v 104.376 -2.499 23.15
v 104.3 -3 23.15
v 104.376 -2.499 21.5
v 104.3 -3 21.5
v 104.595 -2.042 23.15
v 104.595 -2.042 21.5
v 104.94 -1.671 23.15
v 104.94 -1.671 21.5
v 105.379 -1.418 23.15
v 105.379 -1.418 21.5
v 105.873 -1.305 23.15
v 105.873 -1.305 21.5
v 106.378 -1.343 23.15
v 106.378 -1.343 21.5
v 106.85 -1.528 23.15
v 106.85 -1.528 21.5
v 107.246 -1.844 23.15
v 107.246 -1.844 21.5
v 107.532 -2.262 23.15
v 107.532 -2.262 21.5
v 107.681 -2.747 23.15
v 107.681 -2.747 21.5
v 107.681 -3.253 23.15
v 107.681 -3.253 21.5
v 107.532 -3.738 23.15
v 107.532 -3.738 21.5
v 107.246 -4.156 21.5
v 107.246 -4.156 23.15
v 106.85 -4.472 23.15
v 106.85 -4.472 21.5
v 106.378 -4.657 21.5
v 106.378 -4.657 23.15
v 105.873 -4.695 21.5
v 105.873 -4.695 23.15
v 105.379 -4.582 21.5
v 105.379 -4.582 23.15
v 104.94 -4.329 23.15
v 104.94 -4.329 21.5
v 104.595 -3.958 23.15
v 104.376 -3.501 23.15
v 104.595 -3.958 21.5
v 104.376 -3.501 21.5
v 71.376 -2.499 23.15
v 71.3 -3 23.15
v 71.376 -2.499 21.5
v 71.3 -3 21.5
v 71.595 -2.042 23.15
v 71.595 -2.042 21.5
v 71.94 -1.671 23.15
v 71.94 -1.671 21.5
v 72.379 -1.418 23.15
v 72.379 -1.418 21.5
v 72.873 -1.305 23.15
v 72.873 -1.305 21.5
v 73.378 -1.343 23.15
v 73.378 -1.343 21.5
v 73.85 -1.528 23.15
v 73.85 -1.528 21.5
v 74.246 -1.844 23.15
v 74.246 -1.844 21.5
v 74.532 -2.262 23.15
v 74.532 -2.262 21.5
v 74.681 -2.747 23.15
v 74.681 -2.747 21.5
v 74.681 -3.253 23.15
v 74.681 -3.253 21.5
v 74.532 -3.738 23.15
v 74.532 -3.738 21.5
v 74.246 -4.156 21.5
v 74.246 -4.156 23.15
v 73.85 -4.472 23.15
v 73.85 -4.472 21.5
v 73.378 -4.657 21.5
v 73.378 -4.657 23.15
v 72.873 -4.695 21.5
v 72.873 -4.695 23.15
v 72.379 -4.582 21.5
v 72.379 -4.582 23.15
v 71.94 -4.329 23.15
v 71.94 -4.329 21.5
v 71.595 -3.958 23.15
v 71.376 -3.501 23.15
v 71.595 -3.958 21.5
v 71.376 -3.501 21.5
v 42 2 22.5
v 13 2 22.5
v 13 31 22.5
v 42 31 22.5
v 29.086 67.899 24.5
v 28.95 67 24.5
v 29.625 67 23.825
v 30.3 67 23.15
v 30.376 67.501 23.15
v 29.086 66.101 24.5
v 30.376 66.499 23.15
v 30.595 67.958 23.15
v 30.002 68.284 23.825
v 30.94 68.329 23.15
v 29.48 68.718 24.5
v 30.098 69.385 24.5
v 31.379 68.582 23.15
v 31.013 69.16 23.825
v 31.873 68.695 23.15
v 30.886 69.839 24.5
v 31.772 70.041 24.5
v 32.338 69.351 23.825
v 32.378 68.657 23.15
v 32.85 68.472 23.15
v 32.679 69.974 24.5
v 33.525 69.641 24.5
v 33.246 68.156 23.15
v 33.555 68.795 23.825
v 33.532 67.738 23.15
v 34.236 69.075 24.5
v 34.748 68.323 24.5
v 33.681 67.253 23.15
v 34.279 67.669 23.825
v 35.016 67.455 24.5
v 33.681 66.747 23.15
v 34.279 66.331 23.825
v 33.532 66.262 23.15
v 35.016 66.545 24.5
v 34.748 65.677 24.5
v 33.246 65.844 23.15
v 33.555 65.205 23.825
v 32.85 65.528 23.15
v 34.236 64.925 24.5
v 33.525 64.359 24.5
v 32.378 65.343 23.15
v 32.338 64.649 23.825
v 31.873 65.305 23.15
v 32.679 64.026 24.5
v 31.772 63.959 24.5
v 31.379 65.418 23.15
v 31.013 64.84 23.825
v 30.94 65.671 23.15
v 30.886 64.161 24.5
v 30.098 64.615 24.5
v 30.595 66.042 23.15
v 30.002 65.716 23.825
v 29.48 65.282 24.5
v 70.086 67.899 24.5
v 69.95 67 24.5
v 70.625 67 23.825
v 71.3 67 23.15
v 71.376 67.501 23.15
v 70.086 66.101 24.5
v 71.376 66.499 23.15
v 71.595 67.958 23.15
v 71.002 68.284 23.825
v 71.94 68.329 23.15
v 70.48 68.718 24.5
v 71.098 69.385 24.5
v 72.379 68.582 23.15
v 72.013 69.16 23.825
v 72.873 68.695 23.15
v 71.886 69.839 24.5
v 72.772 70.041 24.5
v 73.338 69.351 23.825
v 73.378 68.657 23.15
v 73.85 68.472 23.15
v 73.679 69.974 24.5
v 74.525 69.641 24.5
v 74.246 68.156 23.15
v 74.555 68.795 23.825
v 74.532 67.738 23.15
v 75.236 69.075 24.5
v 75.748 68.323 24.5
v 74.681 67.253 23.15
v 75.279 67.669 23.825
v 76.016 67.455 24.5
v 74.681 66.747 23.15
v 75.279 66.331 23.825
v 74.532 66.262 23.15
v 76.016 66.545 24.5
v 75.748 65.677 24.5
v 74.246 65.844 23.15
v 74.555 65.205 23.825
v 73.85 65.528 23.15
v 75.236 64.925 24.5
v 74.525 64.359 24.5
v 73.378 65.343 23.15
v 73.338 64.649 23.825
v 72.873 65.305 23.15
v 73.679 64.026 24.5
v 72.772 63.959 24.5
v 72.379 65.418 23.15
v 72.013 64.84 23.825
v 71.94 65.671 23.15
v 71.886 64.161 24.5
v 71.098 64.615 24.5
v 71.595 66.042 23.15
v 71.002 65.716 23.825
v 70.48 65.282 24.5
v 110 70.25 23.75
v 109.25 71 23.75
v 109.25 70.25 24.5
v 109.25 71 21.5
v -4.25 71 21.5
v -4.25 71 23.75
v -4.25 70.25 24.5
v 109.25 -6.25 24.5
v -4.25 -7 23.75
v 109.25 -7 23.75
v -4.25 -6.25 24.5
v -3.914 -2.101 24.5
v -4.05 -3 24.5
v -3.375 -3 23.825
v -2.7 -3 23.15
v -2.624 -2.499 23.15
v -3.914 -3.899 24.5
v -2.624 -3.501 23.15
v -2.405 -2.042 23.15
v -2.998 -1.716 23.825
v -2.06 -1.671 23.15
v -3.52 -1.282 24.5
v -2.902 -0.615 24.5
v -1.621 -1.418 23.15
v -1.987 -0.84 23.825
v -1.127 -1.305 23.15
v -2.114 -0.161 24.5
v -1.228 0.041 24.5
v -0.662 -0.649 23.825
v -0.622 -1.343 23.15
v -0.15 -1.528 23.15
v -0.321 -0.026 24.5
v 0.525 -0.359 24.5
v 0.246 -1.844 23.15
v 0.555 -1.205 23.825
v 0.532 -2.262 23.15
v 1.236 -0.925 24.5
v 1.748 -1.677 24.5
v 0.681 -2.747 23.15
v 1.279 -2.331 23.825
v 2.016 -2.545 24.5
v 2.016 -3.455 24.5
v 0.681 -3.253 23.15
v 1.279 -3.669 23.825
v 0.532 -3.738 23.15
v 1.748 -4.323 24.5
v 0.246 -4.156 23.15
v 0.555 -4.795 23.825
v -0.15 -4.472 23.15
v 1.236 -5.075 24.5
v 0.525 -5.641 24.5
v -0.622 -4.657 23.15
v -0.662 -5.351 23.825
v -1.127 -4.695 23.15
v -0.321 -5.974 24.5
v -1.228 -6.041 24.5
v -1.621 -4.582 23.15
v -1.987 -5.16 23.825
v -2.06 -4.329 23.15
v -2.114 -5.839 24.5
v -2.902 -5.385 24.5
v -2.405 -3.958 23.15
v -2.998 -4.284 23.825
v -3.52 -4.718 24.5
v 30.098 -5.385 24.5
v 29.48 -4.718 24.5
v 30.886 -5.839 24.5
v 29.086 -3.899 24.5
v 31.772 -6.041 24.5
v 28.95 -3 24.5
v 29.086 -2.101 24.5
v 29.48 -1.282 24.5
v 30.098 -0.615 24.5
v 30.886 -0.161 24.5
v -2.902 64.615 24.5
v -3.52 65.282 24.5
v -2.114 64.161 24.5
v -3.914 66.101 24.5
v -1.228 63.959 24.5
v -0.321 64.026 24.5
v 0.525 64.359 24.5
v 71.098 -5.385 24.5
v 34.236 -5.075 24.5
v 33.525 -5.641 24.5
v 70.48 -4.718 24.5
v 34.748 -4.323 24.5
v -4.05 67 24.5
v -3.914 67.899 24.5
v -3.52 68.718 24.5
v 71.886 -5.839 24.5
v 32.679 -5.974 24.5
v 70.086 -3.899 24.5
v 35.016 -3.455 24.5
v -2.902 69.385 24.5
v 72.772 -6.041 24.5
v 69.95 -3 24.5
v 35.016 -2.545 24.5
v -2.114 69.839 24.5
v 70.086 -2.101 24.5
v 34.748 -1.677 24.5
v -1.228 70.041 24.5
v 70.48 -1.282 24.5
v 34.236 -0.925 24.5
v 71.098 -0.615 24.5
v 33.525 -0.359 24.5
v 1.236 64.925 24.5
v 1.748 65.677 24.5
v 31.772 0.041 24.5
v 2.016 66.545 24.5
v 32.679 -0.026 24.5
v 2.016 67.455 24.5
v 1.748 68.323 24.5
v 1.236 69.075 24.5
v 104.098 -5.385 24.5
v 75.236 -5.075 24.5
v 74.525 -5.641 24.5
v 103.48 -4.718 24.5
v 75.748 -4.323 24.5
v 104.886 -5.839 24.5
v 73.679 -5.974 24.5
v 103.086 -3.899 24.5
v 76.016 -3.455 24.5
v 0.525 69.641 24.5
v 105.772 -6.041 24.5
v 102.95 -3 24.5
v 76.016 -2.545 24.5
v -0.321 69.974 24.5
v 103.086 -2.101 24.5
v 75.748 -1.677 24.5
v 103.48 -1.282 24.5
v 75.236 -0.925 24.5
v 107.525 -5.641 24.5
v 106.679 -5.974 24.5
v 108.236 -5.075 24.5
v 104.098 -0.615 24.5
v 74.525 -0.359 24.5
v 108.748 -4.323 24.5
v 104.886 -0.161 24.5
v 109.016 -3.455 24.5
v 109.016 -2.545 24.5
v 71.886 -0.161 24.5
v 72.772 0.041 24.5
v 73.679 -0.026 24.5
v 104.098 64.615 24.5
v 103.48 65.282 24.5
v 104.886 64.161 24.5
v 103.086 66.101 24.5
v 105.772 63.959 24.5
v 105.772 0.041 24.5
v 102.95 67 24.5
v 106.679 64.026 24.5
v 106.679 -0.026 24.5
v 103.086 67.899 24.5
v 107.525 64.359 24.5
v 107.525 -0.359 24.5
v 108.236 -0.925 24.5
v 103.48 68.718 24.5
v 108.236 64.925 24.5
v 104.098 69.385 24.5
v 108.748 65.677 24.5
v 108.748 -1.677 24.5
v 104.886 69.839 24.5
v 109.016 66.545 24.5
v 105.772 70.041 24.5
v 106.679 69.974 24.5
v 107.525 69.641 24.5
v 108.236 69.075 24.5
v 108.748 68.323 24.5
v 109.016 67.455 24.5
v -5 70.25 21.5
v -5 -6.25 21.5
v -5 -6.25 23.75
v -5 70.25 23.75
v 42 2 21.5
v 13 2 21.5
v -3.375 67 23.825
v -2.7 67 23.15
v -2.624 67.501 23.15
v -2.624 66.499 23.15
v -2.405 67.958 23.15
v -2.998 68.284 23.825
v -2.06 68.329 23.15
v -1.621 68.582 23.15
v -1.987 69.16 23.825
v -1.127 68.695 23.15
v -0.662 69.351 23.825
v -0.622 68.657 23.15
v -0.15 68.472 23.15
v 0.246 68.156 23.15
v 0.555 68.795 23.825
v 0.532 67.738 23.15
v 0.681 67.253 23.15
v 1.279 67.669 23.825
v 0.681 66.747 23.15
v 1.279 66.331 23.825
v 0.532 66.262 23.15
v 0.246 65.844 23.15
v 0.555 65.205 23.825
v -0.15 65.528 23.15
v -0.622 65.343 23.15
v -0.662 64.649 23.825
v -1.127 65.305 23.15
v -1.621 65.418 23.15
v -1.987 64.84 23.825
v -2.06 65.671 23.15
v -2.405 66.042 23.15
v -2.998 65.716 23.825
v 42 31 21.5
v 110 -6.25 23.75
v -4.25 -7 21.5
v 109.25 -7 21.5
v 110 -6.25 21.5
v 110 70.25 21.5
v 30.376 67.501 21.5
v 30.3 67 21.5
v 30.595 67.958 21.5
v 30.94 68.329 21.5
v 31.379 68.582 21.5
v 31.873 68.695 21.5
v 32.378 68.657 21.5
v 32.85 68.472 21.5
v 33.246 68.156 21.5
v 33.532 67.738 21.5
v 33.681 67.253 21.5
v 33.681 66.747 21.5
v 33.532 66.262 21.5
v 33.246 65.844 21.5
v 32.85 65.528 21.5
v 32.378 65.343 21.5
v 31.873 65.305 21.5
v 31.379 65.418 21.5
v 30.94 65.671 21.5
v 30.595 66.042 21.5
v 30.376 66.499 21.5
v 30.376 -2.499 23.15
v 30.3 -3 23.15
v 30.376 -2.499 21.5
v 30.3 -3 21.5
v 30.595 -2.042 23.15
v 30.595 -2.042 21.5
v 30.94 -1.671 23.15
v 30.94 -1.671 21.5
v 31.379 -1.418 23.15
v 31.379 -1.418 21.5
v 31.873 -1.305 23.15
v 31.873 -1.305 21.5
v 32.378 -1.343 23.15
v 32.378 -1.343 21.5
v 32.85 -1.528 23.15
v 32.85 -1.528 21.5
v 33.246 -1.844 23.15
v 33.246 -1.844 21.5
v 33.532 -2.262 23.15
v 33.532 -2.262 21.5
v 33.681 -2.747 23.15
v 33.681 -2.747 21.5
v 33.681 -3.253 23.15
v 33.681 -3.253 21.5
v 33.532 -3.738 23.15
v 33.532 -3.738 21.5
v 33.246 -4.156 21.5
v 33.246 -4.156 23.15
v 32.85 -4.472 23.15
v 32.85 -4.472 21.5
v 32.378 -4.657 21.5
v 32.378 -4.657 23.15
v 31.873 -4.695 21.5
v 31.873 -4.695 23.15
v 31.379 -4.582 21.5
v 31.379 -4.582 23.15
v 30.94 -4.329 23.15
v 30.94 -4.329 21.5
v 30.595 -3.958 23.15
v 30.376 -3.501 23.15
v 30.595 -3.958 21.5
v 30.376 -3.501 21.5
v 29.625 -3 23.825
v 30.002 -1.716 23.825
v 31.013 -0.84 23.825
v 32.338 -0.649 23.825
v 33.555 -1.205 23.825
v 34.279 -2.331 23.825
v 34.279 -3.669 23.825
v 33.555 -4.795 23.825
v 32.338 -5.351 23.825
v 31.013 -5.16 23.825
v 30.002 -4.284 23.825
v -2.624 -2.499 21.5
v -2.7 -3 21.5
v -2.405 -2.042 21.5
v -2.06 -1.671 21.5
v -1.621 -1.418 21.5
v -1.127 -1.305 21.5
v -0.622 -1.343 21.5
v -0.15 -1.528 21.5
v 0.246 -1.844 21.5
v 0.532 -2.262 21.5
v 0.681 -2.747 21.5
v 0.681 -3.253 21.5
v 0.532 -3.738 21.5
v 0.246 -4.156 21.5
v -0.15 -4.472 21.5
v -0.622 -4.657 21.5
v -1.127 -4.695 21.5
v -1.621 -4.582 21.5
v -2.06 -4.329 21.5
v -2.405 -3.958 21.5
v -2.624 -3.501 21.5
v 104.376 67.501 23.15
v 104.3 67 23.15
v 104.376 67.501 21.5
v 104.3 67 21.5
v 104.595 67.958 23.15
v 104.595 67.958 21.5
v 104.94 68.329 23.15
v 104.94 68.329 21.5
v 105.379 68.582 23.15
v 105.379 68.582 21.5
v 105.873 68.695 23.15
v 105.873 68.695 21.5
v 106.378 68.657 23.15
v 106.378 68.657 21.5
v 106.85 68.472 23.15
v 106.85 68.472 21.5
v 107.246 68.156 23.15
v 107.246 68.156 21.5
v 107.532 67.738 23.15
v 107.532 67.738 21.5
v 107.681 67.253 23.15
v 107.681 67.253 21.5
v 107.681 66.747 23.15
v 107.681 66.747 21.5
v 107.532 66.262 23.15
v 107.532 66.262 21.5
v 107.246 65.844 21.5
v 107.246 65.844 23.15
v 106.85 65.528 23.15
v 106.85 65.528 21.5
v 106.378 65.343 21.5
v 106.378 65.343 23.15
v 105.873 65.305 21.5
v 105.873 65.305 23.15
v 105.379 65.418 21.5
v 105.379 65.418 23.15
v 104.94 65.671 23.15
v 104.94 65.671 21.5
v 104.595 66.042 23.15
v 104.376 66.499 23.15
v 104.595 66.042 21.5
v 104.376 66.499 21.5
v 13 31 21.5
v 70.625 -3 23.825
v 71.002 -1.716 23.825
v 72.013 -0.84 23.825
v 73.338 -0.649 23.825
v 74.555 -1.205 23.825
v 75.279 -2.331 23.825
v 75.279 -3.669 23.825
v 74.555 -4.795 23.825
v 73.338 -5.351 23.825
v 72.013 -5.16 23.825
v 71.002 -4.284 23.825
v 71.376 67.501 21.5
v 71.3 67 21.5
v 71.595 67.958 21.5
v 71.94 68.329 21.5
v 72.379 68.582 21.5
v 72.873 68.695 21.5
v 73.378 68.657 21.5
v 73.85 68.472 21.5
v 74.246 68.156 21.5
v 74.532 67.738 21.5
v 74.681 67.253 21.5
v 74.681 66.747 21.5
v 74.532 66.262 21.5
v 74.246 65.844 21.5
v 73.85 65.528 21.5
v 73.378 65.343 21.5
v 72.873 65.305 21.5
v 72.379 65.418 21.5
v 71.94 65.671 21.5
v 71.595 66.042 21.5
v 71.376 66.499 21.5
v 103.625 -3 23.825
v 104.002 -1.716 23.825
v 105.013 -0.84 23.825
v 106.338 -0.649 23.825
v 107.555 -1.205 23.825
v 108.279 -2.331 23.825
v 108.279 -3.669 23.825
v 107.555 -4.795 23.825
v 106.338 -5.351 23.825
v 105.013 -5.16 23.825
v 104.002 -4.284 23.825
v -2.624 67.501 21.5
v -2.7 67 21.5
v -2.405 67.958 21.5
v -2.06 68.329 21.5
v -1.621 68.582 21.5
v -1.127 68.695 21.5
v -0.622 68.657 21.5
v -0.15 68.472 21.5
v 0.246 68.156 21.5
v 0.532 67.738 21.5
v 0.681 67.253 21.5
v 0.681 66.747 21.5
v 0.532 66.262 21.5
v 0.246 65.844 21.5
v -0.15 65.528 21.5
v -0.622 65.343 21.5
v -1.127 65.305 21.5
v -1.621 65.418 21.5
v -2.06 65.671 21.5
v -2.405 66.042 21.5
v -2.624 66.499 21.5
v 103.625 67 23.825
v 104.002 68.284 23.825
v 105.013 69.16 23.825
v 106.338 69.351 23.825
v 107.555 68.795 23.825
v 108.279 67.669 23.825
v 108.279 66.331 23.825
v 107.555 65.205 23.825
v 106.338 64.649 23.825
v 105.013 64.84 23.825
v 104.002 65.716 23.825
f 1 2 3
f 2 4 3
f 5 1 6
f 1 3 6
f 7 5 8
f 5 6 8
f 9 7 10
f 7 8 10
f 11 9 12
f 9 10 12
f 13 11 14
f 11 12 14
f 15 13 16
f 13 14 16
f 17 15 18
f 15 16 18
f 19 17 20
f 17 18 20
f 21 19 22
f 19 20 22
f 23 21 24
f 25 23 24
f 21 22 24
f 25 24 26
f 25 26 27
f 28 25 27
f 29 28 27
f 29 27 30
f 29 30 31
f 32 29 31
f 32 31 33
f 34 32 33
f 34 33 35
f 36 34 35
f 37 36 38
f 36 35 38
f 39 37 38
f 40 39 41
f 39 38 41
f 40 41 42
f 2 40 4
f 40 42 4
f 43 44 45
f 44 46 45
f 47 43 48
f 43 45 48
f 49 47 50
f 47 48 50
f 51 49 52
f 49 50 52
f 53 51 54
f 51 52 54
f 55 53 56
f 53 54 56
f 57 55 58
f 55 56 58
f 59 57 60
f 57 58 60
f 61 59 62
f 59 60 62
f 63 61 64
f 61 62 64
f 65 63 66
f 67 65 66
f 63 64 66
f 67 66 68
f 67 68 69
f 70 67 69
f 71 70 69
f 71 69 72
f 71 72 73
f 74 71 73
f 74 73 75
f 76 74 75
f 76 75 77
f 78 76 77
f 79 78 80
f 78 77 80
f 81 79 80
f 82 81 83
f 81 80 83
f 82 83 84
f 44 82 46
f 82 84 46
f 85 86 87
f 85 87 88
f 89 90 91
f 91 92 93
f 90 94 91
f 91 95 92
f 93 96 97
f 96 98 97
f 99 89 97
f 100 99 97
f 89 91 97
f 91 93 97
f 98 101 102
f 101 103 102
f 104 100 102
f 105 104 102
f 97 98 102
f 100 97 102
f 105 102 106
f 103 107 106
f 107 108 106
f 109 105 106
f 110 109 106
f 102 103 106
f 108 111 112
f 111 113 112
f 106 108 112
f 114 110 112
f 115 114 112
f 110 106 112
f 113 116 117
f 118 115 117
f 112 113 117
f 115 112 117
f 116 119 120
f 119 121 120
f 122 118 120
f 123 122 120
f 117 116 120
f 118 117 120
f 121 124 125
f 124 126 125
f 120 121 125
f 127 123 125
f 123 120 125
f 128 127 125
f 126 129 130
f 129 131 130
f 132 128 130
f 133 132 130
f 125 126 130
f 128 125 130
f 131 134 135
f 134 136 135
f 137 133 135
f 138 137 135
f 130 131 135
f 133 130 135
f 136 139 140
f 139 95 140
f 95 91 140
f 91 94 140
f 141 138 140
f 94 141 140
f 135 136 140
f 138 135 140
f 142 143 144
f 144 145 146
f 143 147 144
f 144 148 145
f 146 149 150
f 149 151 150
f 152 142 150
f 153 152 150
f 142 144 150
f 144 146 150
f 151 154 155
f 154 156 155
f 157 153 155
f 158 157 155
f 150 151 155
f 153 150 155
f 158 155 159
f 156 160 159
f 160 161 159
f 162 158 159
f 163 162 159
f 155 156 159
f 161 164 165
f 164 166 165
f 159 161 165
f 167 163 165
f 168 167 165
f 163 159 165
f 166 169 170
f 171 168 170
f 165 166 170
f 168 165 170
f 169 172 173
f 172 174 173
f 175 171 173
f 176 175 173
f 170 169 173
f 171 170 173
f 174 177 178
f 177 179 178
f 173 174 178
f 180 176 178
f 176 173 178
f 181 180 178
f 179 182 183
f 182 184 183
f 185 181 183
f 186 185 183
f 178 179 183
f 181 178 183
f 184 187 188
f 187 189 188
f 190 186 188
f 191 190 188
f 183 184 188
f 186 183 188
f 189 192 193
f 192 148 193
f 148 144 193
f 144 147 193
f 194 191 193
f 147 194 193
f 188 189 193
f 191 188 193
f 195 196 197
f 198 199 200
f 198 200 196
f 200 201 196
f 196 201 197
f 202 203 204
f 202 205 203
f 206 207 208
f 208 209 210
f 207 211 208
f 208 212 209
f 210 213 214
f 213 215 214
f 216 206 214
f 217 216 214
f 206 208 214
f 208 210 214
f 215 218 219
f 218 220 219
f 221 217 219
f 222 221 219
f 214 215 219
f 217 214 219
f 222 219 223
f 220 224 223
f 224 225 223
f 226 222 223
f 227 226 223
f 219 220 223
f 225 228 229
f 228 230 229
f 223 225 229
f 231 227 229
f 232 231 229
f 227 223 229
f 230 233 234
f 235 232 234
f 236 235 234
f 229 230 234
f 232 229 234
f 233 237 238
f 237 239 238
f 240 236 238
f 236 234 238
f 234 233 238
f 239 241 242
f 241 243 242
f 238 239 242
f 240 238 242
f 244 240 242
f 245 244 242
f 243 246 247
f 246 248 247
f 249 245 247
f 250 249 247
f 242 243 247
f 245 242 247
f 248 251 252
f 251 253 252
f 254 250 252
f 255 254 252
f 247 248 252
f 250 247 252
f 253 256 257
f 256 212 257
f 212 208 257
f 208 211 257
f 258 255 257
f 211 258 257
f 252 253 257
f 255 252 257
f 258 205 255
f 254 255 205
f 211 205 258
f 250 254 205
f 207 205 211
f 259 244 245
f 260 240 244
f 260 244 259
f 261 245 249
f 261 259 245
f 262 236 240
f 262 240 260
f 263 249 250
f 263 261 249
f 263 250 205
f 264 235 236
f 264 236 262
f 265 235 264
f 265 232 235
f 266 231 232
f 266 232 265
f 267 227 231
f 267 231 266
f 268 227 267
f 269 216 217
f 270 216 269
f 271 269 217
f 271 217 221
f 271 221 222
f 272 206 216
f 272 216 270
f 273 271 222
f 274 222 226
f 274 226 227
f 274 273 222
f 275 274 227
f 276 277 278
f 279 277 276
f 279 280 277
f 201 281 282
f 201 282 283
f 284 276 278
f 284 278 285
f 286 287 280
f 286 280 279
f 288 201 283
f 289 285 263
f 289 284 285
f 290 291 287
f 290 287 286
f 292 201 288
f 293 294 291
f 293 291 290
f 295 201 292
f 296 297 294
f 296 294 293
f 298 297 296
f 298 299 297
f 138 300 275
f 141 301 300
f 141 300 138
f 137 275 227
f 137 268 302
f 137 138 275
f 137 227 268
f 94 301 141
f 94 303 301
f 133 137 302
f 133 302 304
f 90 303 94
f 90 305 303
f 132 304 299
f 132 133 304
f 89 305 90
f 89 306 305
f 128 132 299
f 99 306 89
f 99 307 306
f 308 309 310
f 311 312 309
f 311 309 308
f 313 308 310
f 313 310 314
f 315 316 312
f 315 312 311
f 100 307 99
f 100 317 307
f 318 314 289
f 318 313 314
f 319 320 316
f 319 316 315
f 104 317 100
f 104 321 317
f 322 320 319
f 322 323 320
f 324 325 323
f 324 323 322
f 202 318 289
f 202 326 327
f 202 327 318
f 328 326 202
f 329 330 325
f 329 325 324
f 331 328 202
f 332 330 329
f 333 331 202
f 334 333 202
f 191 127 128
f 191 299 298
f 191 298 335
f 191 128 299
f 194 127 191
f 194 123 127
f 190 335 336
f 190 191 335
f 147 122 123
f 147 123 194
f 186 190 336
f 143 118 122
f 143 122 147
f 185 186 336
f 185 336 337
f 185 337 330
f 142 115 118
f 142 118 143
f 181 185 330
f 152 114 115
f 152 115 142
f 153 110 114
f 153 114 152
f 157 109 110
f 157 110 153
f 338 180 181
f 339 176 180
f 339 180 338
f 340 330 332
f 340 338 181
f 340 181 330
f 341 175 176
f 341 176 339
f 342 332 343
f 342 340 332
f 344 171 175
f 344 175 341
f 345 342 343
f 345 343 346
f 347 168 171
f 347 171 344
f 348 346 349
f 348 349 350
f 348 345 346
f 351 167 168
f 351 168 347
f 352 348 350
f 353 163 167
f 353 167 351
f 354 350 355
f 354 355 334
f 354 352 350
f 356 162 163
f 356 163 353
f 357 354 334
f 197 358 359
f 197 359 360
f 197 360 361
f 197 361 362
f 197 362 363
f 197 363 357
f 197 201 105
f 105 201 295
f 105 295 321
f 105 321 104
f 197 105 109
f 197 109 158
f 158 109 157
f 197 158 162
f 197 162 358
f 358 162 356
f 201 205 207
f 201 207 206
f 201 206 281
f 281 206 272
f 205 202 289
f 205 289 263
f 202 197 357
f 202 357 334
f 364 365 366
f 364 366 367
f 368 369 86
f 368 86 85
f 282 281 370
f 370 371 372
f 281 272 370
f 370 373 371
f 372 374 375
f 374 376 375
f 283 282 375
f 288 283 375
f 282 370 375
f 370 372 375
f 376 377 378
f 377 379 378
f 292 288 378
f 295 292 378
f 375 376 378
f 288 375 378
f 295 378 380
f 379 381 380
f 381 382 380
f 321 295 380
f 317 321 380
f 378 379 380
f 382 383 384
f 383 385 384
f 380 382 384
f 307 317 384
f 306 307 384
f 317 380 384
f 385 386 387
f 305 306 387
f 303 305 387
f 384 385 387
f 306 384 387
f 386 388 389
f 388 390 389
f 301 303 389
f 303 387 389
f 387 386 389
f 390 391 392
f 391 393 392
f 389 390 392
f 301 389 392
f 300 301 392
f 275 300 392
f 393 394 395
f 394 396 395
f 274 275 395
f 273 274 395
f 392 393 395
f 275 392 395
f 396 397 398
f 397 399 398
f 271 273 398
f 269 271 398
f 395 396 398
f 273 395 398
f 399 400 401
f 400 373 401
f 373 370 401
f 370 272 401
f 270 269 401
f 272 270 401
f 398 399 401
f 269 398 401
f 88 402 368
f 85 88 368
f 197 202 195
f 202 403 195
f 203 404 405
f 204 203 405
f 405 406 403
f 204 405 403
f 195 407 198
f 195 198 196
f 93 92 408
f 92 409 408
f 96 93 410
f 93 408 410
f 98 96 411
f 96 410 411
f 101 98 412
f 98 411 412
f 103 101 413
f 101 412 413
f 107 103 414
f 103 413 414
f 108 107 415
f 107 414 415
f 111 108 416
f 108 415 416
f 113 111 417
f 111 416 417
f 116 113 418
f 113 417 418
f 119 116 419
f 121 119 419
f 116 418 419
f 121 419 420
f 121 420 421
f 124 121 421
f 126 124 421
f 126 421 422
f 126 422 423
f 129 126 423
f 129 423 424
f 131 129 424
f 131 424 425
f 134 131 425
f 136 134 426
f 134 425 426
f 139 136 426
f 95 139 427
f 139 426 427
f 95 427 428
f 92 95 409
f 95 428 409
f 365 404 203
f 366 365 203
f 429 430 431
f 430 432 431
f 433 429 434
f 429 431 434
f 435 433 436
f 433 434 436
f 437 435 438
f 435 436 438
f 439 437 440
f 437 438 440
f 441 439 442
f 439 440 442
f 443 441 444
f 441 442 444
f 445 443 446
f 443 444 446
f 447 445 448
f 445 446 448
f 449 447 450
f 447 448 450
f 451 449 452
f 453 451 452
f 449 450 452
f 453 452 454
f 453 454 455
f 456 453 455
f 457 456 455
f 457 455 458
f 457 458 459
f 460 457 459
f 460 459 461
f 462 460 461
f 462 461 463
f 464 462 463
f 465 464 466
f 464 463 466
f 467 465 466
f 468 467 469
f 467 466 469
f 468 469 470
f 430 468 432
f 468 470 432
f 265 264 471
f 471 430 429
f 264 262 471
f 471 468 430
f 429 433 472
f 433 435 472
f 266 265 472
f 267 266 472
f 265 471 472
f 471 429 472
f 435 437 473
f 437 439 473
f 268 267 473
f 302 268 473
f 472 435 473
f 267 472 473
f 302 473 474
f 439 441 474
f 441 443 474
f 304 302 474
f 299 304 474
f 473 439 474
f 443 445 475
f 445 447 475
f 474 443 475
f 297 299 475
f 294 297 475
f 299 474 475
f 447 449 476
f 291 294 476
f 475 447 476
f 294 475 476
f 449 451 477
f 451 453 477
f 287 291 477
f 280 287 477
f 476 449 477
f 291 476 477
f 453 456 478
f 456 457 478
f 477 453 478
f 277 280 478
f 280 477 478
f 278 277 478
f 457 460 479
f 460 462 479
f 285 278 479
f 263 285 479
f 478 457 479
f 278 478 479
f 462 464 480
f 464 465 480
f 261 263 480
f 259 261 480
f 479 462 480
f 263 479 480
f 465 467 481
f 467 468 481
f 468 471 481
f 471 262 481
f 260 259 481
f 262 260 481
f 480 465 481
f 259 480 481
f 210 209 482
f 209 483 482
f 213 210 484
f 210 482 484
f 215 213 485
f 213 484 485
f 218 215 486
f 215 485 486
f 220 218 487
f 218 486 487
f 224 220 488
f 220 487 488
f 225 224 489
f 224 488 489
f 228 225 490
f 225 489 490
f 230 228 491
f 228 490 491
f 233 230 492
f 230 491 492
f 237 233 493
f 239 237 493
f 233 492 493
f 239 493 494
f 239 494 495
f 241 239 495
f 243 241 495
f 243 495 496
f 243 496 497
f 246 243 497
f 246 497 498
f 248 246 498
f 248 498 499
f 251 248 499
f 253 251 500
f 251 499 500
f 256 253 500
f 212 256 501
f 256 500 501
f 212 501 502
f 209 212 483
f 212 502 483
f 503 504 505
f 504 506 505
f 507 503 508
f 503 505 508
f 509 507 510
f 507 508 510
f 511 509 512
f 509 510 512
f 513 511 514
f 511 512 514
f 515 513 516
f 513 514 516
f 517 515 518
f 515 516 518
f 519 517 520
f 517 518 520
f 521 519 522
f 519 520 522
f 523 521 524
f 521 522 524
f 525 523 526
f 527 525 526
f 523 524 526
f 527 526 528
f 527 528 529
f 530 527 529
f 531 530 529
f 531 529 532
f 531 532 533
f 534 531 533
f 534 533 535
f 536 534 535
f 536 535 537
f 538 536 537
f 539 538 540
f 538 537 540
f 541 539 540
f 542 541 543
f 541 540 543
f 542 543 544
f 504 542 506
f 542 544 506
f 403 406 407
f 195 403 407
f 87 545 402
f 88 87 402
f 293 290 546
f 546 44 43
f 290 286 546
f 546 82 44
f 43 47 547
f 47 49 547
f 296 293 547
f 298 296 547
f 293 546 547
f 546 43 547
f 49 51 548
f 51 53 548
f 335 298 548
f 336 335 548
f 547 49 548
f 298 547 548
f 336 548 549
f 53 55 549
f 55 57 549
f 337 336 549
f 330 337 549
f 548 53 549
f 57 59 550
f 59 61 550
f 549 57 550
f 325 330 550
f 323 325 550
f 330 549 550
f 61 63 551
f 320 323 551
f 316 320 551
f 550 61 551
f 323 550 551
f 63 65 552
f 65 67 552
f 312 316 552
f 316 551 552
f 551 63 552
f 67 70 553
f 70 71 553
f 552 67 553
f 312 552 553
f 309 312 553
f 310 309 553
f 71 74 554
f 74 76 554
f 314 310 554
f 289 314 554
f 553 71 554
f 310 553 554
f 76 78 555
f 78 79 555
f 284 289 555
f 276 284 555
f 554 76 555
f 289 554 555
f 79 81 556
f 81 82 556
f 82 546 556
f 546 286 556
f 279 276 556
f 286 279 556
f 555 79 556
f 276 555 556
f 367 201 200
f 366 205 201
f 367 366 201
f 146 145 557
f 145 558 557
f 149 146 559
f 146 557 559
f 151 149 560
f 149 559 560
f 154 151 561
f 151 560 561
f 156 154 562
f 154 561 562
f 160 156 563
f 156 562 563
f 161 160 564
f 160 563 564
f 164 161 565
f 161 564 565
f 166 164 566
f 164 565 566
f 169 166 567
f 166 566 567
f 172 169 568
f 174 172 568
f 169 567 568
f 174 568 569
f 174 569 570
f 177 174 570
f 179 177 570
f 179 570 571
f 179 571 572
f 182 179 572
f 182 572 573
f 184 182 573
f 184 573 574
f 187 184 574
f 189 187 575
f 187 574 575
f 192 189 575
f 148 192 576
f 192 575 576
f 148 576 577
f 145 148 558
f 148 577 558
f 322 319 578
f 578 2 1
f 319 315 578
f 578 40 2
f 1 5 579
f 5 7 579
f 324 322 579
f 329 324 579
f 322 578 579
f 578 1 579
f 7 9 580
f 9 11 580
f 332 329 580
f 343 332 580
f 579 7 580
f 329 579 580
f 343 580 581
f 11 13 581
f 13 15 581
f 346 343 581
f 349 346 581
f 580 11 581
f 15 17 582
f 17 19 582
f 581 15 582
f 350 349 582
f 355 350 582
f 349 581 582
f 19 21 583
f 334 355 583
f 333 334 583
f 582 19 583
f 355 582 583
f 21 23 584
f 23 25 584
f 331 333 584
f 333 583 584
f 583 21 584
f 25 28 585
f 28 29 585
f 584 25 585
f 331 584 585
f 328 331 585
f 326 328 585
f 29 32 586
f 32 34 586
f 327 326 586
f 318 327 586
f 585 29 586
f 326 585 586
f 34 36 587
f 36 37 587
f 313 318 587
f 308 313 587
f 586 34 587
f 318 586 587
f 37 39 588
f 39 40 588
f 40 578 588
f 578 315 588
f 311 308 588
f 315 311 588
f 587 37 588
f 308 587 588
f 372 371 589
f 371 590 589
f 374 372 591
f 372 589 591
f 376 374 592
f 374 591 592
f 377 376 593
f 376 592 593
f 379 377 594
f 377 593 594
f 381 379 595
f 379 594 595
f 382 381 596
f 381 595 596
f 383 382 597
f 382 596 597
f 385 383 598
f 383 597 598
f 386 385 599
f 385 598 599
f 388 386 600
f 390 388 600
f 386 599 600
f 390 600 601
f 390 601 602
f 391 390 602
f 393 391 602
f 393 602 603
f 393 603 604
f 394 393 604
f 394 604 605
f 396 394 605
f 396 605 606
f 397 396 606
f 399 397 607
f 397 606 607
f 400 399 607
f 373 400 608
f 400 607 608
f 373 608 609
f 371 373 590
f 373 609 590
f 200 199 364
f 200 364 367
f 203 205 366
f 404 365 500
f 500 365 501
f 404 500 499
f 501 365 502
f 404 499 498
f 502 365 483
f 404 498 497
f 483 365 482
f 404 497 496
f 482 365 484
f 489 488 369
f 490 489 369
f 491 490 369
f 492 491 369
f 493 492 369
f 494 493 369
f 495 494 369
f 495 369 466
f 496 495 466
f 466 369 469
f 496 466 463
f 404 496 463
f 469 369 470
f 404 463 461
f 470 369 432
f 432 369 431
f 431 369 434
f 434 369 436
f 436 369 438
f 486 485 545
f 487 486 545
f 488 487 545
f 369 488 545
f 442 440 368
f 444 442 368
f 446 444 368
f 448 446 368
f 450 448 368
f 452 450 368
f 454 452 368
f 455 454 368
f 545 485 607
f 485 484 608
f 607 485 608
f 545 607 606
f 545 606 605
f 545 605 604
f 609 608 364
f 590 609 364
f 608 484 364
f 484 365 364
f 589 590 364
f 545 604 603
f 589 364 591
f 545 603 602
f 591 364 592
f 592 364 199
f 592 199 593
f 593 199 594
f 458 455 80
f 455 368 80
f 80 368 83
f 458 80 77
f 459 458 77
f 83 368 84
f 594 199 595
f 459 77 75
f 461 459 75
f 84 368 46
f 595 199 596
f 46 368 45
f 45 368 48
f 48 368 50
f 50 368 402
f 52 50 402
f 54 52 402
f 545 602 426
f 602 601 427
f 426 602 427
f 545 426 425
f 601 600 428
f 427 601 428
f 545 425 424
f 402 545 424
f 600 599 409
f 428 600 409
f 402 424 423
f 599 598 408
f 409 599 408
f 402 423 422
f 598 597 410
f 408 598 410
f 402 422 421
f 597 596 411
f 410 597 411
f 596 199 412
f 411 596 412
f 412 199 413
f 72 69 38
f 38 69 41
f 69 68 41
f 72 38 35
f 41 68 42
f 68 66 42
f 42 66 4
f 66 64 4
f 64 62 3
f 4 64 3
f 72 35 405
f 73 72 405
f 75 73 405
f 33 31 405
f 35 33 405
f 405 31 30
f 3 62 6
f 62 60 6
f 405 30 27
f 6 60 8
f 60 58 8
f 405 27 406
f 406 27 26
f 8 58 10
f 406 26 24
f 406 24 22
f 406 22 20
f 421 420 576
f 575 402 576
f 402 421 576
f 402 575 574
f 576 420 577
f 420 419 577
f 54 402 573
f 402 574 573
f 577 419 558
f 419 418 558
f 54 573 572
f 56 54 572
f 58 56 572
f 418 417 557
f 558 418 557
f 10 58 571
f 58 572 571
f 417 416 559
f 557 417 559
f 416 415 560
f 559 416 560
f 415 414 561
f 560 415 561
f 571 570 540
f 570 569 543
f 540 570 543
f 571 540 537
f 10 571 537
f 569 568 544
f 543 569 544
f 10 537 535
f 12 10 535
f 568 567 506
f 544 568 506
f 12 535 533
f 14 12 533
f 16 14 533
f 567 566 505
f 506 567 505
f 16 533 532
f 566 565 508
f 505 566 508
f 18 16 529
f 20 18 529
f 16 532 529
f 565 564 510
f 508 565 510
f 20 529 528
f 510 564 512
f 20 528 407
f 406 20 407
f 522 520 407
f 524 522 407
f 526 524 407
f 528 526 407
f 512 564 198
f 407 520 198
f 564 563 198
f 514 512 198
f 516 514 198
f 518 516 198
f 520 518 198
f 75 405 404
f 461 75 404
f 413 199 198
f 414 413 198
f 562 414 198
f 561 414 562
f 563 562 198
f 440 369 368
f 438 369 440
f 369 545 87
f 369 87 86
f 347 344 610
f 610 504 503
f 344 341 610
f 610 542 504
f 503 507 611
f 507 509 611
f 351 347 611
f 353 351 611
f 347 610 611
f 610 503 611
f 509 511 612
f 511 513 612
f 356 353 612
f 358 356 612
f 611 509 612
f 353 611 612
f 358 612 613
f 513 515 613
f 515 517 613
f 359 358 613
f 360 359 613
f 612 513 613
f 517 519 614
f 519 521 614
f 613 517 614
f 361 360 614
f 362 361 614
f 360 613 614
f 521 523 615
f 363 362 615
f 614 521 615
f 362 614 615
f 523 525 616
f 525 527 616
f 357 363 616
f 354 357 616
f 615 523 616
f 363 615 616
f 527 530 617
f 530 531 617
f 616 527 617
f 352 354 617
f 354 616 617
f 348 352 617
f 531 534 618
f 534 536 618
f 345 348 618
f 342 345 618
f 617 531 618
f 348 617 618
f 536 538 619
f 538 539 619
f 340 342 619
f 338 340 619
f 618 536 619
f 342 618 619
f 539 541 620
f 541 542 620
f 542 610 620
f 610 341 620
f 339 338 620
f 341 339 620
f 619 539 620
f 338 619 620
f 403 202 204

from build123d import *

# Parameters (mm, degrees)
SKETCH022_W         = 115
SKETCH022_H         = 78
PAD010_DEPTH        = 3
HOLE002_D           = 3.4
HOLE002_DEPTH       = 5
HOLE002_CSINK_D     = 6.1
HOLE002_CSINK_ANGLE = 90
SKETCH027_W         = 29
SKETCH027_H         = 29
POCKET009_DEPTH     = 1
CHAMFER001_SIZE     = 0.75


with BuildPart() as part:
    # Sketch022 (on Face1 of CopyPad011) → Pad010 (new body)
    with BuildSketch(Plane.XY.offset(24)):
        with Locations((52.5, 32)):
            Rectangle(SKETCH022_W, SKETCH022_H)
    extrude(amount=PAD010_DEPTH)

    # Hole002
    with Locations(Plane.XY.offset(27)):
        with Locations((-1, 67), (106, 67), (106, -3), (-1, -3), (32, 67), (73, -3), (32, -3), (73, 67)):
            CounterSinkHole(HOLE002_D / 2, HOLE002_CSINK_D / 2, depth=HOLE002_DEPTH, counter_sink_angle=HOLE002_CSINK_ANGLE)

    # Sketch027 → Pocket009 (cut)
    with BuildSketch(Plane(origin=(0, 0, 24), x_dir=(1, 0, 0), z_dir=(0, 0, -1))):
        with Locations((27.5, -16.5)):
            Rectangle(SKETCH027_W, SKETCH027_H)
    extrude(amount=-POCKET009_DEPTH, mode=Mode.SUBTRACT)

    # Chamfer001
    chamfer001_edges = [part.edges().sort_by_distance(p)[0] for p in [
        (52.5, 71, 27),
        (110, 71, 25.5),
        (110, 32, 27),
        (52.5, -7, 27),
        (110, -7, 25.5),
        (-5, 32, 27),
        (-5, 71, 25.5),
        (-5, -7, 25.5),
    ]]
    chamfer(chamfer001_edges, length=CHAMFER001_SIZE)


with BuildPart() as part_1:
    # Body002 placement: moved
    add(part.part.moved(Location((0, 0, -2.5))))


solid = part_1.part
